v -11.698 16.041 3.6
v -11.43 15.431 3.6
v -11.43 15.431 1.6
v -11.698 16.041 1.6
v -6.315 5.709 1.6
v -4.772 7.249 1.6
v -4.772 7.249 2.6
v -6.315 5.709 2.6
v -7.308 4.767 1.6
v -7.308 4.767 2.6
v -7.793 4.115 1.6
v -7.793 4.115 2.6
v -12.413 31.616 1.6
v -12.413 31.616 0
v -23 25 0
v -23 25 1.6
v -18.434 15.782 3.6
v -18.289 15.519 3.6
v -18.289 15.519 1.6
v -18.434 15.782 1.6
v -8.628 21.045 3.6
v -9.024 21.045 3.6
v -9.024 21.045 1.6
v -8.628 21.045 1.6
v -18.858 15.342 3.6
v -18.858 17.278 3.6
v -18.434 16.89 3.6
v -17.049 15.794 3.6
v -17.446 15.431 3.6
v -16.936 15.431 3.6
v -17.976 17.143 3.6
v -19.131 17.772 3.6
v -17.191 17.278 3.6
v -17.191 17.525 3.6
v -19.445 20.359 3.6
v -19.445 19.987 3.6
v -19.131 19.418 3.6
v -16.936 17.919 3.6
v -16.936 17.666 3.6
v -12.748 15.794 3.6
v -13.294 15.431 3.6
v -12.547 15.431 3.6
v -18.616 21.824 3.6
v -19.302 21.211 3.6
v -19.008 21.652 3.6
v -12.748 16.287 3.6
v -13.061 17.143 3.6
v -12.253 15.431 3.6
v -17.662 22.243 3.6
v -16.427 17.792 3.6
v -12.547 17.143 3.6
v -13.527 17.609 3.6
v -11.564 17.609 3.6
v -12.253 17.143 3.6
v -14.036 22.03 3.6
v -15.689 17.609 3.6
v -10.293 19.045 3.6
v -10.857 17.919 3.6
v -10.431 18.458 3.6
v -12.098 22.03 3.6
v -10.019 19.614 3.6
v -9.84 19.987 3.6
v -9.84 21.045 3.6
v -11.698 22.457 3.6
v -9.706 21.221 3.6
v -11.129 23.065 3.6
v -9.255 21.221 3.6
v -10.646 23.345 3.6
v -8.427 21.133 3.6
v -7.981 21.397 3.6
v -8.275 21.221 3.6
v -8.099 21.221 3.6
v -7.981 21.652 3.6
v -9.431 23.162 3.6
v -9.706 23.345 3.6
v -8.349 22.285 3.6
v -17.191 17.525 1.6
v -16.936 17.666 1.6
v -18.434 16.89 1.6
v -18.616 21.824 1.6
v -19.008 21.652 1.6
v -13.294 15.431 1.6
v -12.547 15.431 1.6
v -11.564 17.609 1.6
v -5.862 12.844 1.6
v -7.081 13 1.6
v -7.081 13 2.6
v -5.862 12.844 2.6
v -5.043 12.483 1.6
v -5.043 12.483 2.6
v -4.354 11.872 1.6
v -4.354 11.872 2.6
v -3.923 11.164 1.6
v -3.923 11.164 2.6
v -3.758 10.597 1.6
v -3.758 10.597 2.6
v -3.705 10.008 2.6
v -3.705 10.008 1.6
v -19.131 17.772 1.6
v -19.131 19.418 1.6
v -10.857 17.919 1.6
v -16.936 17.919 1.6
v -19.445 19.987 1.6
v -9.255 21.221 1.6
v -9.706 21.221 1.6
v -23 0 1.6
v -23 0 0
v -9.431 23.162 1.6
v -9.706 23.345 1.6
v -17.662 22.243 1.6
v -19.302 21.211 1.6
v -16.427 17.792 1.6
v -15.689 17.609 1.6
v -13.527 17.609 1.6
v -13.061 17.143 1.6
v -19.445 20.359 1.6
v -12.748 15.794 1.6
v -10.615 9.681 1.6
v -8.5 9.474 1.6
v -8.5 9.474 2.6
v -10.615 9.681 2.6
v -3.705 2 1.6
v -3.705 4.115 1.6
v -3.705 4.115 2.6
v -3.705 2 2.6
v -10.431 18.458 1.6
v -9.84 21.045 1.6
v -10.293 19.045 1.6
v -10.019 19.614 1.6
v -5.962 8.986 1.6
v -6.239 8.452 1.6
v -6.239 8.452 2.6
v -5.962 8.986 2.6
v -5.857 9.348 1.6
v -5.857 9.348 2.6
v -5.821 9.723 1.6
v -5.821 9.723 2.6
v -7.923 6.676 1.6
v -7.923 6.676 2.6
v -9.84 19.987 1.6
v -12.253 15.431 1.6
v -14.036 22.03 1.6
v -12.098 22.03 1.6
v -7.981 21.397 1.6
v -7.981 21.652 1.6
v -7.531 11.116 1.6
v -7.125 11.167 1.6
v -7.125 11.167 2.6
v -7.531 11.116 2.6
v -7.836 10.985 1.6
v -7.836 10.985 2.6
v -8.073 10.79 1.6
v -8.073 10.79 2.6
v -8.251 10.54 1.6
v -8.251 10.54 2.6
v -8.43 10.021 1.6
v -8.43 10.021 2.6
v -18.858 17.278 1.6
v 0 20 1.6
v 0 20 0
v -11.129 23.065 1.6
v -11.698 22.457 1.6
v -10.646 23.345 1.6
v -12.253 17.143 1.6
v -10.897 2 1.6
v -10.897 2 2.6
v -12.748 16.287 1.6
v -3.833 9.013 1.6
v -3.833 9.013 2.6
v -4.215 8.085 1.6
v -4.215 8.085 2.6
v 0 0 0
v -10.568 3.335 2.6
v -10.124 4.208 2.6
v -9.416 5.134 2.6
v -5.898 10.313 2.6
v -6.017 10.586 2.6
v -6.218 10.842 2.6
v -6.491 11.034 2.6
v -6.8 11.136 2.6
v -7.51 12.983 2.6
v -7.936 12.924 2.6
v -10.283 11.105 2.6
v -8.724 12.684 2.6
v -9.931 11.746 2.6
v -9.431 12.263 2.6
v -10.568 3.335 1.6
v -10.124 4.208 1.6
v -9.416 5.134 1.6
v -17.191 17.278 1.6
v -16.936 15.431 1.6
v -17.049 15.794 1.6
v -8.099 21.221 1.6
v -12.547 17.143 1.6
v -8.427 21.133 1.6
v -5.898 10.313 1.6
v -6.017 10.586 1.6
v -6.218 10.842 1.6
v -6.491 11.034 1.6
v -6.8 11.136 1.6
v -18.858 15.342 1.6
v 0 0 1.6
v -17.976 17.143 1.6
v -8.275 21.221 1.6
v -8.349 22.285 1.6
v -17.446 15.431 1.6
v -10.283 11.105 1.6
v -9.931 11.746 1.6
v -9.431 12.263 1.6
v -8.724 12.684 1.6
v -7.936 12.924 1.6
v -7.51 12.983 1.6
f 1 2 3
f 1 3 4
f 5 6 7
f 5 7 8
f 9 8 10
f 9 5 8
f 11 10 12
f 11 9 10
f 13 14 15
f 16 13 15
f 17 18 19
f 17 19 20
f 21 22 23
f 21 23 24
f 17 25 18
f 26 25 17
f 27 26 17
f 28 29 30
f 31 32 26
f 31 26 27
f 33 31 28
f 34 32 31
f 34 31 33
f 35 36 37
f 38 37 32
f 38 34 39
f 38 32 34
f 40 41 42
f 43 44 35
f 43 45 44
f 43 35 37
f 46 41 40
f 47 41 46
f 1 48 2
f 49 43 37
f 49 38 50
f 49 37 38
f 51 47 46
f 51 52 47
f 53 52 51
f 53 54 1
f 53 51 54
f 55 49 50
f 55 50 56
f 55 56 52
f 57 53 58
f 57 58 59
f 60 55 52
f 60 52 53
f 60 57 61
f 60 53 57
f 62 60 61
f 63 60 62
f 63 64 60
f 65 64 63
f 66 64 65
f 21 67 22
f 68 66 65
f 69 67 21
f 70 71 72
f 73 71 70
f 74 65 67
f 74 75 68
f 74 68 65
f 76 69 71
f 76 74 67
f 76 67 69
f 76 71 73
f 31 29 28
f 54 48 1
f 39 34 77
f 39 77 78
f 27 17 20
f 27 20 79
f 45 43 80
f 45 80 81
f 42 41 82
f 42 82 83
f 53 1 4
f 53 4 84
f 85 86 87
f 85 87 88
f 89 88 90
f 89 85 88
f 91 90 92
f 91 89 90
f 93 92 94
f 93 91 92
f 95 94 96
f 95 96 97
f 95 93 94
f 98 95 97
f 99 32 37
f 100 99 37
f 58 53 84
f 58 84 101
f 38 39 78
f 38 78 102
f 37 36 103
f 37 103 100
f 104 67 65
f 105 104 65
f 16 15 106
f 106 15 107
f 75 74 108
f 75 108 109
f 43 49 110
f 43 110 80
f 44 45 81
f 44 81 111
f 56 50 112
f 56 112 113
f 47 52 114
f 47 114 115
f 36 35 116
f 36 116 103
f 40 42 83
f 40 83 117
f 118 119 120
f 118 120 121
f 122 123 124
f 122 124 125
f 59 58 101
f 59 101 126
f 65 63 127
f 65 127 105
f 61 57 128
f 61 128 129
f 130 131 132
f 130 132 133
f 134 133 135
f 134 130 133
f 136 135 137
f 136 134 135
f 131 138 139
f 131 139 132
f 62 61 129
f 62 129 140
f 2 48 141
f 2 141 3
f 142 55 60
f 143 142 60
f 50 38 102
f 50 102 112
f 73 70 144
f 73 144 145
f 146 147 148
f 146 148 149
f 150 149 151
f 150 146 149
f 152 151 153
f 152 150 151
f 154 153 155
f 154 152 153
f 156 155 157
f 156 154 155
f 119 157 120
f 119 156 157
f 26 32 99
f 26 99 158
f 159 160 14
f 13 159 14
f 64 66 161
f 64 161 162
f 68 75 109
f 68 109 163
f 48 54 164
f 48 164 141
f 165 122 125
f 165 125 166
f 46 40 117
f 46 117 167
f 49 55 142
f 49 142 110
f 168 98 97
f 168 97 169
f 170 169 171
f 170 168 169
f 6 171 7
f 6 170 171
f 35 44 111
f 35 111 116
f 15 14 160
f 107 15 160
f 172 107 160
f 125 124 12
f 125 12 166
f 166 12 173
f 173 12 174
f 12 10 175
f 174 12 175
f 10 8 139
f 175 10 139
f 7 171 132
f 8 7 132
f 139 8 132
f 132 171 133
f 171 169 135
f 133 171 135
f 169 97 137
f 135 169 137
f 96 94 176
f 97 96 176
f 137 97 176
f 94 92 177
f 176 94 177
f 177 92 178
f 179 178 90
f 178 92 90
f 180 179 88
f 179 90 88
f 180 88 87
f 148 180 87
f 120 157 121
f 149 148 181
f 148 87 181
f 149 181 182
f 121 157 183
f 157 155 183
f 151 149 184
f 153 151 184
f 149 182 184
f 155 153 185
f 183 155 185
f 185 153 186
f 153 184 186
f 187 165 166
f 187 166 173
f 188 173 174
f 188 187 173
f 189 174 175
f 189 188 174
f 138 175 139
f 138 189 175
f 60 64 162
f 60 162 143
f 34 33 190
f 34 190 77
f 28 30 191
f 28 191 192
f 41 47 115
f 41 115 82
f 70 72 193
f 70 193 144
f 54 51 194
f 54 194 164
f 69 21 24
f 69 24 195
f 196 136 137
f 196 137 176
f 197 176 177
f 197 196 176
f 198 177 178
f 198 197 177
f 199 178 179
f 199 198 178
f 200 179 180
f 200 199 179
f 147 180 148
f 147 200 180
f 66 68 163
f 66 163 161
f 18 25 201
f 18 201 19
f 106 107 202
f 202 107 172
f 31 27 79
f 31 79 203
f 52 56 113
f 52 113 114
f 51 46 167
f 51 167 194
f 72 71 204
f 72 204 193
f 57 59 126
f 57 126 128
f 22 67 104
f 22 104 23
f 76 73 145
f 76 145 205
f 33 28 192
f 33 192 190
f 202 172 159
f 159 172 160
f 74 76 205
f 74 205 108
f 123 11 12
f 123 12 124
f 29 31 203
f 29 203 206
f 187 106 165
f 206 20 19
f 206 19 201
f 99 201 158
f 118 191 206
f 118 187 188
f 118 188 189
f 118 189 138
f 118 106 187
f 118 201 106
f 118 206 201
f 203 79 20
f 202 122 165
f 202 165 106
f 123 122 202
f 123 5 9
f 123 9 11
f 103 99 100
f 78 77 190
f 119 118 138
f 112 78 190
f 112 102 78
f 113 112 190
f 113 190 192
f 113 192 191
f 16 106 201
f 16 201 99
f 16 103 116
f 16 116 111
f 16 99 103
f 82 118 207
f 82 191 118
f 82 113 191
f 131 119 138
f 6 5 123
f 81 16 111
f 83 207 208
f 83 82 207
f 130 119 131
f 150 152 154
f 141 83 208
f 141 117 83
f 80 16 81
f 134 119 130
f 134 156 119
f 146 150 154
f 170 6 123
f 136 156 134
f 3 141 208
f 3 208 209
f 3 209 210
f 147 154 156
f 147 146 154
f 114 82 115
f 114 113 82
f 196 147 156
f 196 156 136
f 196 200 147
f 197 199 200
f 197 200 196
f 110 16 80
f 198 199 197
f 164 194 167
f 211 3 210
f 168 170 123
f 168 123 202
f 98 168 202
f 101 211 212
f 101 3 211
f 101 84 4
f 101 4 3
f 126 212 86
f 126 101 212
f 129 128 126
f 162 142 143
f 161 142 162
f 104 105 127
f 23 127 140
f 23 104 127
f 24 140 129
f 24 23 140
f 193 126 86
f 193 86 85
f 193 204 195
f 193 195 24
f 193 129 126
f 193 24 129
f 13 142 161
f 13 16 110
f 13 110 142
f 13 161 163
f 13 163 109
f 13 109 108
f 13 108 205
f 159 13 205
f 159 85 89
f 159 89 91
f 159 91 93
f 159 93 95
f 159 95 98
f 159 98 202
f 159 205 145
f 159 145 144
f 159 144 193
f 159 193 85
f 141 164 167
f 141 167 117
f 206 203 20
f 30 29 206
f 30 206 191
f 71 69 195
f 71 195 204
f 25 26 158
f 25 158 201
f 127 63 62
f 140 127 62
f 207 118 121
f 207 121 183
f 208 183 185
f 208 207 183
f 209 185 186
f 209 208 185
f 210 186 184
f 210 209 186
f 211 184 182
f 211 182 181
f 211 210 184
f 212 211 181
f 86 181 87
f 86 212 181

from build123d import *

# Parameters (mm, degrees)
P_IDAT_VYSUNUT_M5_DEPTH = 1.6
P_IDAT_VYSUNUT_M6_DEPTH = 1
SKETCH1_W               = 14
SKETCH1_H               = 8.811343348
BOSS_EXTRUDE1_DEPTH     = 2
SKETCH2_W               = 14
SKETCH2_H               = 8.811343348
CUT_EXTRUDE1_DEPTH      = 2


with BuildPart() as part:
    # Skica1 → Přidat vysunutím5 (new body)
    with BuildSketch(Plane.XY):
        Polygon((0, 0), (0, 20), (-12.412784718, 31.615626352), (-23, 25), (-23, 0), align=None)
    extrude(amount=P_IDAT_VYSUNUT_M5_DEPTH)

    # Skica2 → Přidat vysunutím6 (add)
    with BuildSketch(Plane.XY.offset(1.6)):
        with BuildLine():
            Line((-3.705128205, 4.115384615), (-3.705128205, 2))
            Line((-3.705128205, 2), (-10.897435897, 2))
            add(Edge.make_bspline(
                [(-10.897435897, 2), (-10.87308441, 2.180790308), (-10.824395089, 2.542269551), (-10.673865117, 3.070299742), (-10.472959166, 3.585566992), (-10.254913916, 4.004869463), (-10.038043764, 4.342393523), (-9.841277463, 4.618963346), (-9.60654249, 4.913221767), (-9.337245105, 5.227544267), (-9.034873554, 5.562913411), (-8.697171951, 5.918082368), (-8.322529407, 6.291350846), (-8.058961705, 6.54481851), (-7.922676282, 6.67588141)],
                knots=[0, 0, 0, 0, 0.000546661, 0.001093015, 0.001642153, 0.002203944, 0.002507135, 0.00284526, 0.003221747, 0.003635945, 0.00408685, 0.004576261, 0.005106025, 0.00567326, 0.00567326, 0.00567326, 0.00567326], degree=3))
            add(Edge.make_bspline(
                [(-7.922676282, 6.67588141), (-7.813918956, 6.780862005), (-7.606877039, 6.980714138), (-7.312048947, 7.266894293), (-7.052864674, 7.529975199), (-6.823905036, 7.763139303), (-6.630459323, 7.972323552), (-6.469982936, 8.154242742), (-6.34044346, 8.309637702), (-6.270284768, 8.408220362), (-6.239182692, 8.451923077)],
                knots=[0, 0, 0, 0, 0.000453482, 0.000863296, 0.001232576, 0.001561374, 0.001843606, 0.002087173, 0.00228919, 0.002450062, 0.002450062, 0.002450062, 0.002450062], degree=3))
            add(Edge.make_bspline(
                [(-6.239182692, 8.451923077), (-6.175493233, 8.557718073), (-6.052643645, 8.761784362), (-5.91792888, 9.082682292), (-5.837068057, 9.403513936), (-5.825971765, 9.617891805), (-5.820512821, 9.723357372)],
                knots=[0, 0, 0, 0, 0.000370068, 0.000713818, 0.001040364, 0.001356575, 0.001356575, 0.001356575, 0.001356575], degree=3))
            add(Edge.make_bspline(
                [(-5.820512821, 9.723357372), (-5.824474653, 9.833108474), (-5.831970132, 10.040748999), (-5.894821019, 10.333768175), (-6.006276867, 10.585659667), (-6.15973106, 10.797196661), (-6.353774193, 10.962935085), (-6.580616259, 11.085399693), (-6.843577862, 11.153106661), (-7.028402789, 11.16201224), (-7.125, 11.166666667)],
                knots=[0, 0, 0, 0, 0.000329064, 0.000622563, 0.000892834, 0.001149779, 0.00139978, 0.001652148, 0.001916728, 0.002206405, 0.002206405, 0.002206405, 0.002206405], degree=3))
            add(Edge.make_bspline(
                [(-7.125, 11.166666667), (-7.220944609, 11.16231978), (-7.406288878, 11.153922533), (-7.669703299, 11.080565334), (-7.900142302, 10.953576306), (-8.06436539, 10.808860058), (-8.175305876, 10.668134018), (-8.250896853, 10.545500545), (-8.316050374, 10.406151312), (-8.37378183, 10.251655158), (-8.419383153, 10.080242168), (-8.456107626, 9.893217825), (-8.485702239, 9.689575671), (-8.495113848, 9.547907653), (-8.5, 9.474358974)],
                knots=[0, 0, 0, 0, 0.000287482, 0.000555353, 0.000811759, 0.001070877, 0.001205779, 0.00134826, 0.001502018, 0.001666561, 0.00184243, 0.002033439, 0.002238177, 0.002459233, 0.002459233, 0.002459233, 0.002459233], degree=3))
            Line((-8.5, 9.474358974), (-10.615384615, 9.681490385))
            add(Edge.make_bspline(
                [(-10.615384615, 9.681490385), (-10.598377251, 9.824305509), (-10.565402688, 10.101201217), (-10.483114114, 10.498918926), (-10.378898684, 10.865831465), (-10.247788098, 11.201257911), (-10.095201314, 11.507331251), (-9.913355139, 11.779458664), (-9.708603468, 12.020654551), (-9.480769352, 12.230790543), (-9.231301205, 12.410535137), (-8.969529148, 12.57098477), (-8.690337423, 12.702604473), (-8.396799939, 12.811078884), (-8.089049352, 12.897770766), (-7.765662274, 12.955090263), (-7.42863453, 12.995409017), (-7.198577984, 12.998446608), (-7.080929487, 13)],
                knots=[0, 0, 0, 0, 0.000431306, 0.000836233, 0.001217004, 0.001574233, 0.001915203, 0.002240945, 0.002553567, 0.002862328, 0.003168197, 0.003474678, 0.003782194, 0.004092453, 0.004412693, 0.004739863, 0.005076887, 0.005429623, 0.005429623, 0.005429623, 0.005429623], degree=3))
            add(Edge.make_bspline(
                [(-7.080929487, 13), (-6.953030371, 12.997541845), (-6.703930784, 12.992754281), (-6.34028961, 12.953218534), (-5.998674853, 12.884282231), (-5.676099879, 12.79296634), (-5.375877361, 12.67105295), (-5.095505554, 12.52366473), (-4.83939702, 12.345207999), (-4.603734114, 12.145414763), (-4.393070332, 11.925706984), (-4.20854792, 11.691351493), (-4.053955652, 11.442511564), (-3.924228998, 11.182220281), (-3.827907833, 10.90628918), (-3.757724044, 10.618533633), (-3.711189366, 10.317611197), (-3.707170936, 10.112088), (-3.705128205, 10.007612179)],
                knots=[0, 0, 0, 0, 0.000383641, 0.00074719, 0.0010955, 0.001428145, 0.001751403, 0.002065859, 0.002376361, 0.002685876, 0.002991333, 0.003287991, 0.003579024, 0.003868752, 0.004158681, 0.00445369, 0.004756592, 0.005069772, 0.005069772, 0.005069772, 0.005069772], degree=3))
            add(Edge.make_bspline(
                [(-3.705128205, 10.007612179), (-3.707819477, 9.887707131), (-3.713158546, 9.649833916), (-3.764276175, 9.298186238), (-3.84237396, 8.954647512), (-3.957796338, 8.618378159), (-4.104103161, 8.28131186), (-4.292696164, 7.942692037), (-4.511666905, 7.592306518), (-4.683112364, 7.36576699), (-4.771634615, 7.248798077)],
                knots=[0, 0, 0, 0, 0.000359506, 0.000713204, 0.001063842, 0.00141504, 0.001778167, 0.002164709, 0.002576738, 0.003016589, 0.003016589, 0.003016589, 0.003016589], degree=3))
            add(Edge.make_bspline(
                [(-4.771634615, 7.248798077), (-4.80509214, 7.206658226), (-4.876750403, 7.116404431), (-4.998659939, 6.978014195), (-5.139942605, 6.826848432), (-5.298602846, 6.660077667), (-5.479881522, 6.483607708), (-5.677256214, 6.290058721), (-5.899411985, 6.089331377), (-6.12951153, 5.876418507), (-6.360611244, 5.669193404), (-6.5730252, 5.472375498), (-6.765967752, 5.298233923), (-6.930453202, 5.137155265), (-7.076156545, 5.000133027), (-7.197826149, 4.880140867), (-7.29773874, 4.780083699), (-7.43541186, 4.624119958), (-7.610585282, 4.413178934), (-7.733826947, 4.21161882), (-7.792668269, 4.115384615)],
                knots=[0, 0, 0, 0, 0.0001614, 0.000345681, 0.000553058, 0.000782151, 0.00103613, 0.001311959, 0.001611379, 0.001934216, 0.002252456, 0.002542536, 0.002802971, 0.003032064, 0.003233117, 0.00340296, 0.003544758, 0.003657116, 0.004027059, 0.004365069, 0.004365069, 0.004365069, 0.004365069], degree=3))
            Line((-7.792668269, 4.115384615), (-3.705128205, 4.115384615))
        make_face()
    extrude(amount=P_IDAT_VYSUNUT_M6_DEPTH)

    # Sketch1 → Boss-Extrude1 (add)
    with BuildSketch(Plane.XY.offset(1.6)):
        with Locations((-14, 19.405671674)):
            Rectangle(SKETCH1_W, SKETCH1_H)
    extrude(amount=BOSS_EXTRUDE1_DEPTH)

    # Sketch2 → Cut-Extrude1 (cut)
    with BuildSketch(Plane.XY.offset(3.6)):
        with Locations((-14, 19.405671674)):
            Rectangle(SKETCH2_W, SKETCH2_H)
        Polygon((-19.444720722, 20.35888782), (-19.444720722, 19.986569127), (-19.131189191, 19.418293227), (-19.131189191, 18.066188499), (-19.131189191, 17.772252689), (-18.858242416, 17.277536659), (-18.858242416, 15.342383323), (-18.288573201, 15.518744809), (-18.433763737, 15.781902655), (-18.433763737, 16.890445258), (-17.976410423, 17.14277812), (-17.446333305, 15.430564066), (-16.936468473, 15.430564066), (-17.049096134, 15.794365214), (-17.191400889, 17.277536659), (-17.191400889, 17.524894674), (-16.936468473, 17.665547041), (-16.936468473, 17.919220594), (-16.426979735, 17.792383818), (-15.689001428, 17.608664763), (-13.526813072, 17.608664763), (-13.06092643, 17.14277812), (-13.293869751, 15.430564066), (-12.547027038, 15.430564066), (-12.747744912, 15.794365214), (-12.747744912, 16.286671093), (-12.547027038, 17.14277812), (-12.253091227, 17.14277812), (-12.253091227, 15.430564066), (-11.430070958, 15.430564066), (-11.697847079, 16.040518153), (-11.563959019, 17.608664763), (-10.856559128, 17.919220594), (-10.430689203, 18.458102913), (-10.293165377, 19.044673063), (-10.019179068, 19.614250434), (-9.840080969, 19.986569127), (-9.840080969, 20.574440748), (-9.840080969, 21.044738045), (-9.705647537, 21.221099531), (-9.431307447, 21.221099531), (-9.254945961, 21.221099531), (-9.023579601, 21.044738045), (-8.627882899, 21.044738045), (-8.427020311, 21.132918788), (-8.275159926, 21.221099531), (-8.09879844, 21.221099531), (-7.981224116, 21.397461017), (-7.981224116, 21.652205386), (-8.348696256, 22.285047188), (-9.431307447, 23.161851588), (-9.705647537, 23.344744981), (-10.64624213, 23.344744981), (-11.128859966, 23.064503366), (-11.697847079, 22.457055221), (-12.098019445, 22.02983296), (-12.547027038, 22.02983296), (-14.03630181, 22.02983296), (-17.661510139, 22.24344409), (-18.61604593, 21.824393055), (-19.008263773, 21.652205386), (-19.30233871, 21.21109298), align=None, mode=Mode.SUBTRACT)
    extrude(amount=-CUT_EXTRUDE1_DEPTH, mode=Mode.SUBTRACT)


solid = part.part
